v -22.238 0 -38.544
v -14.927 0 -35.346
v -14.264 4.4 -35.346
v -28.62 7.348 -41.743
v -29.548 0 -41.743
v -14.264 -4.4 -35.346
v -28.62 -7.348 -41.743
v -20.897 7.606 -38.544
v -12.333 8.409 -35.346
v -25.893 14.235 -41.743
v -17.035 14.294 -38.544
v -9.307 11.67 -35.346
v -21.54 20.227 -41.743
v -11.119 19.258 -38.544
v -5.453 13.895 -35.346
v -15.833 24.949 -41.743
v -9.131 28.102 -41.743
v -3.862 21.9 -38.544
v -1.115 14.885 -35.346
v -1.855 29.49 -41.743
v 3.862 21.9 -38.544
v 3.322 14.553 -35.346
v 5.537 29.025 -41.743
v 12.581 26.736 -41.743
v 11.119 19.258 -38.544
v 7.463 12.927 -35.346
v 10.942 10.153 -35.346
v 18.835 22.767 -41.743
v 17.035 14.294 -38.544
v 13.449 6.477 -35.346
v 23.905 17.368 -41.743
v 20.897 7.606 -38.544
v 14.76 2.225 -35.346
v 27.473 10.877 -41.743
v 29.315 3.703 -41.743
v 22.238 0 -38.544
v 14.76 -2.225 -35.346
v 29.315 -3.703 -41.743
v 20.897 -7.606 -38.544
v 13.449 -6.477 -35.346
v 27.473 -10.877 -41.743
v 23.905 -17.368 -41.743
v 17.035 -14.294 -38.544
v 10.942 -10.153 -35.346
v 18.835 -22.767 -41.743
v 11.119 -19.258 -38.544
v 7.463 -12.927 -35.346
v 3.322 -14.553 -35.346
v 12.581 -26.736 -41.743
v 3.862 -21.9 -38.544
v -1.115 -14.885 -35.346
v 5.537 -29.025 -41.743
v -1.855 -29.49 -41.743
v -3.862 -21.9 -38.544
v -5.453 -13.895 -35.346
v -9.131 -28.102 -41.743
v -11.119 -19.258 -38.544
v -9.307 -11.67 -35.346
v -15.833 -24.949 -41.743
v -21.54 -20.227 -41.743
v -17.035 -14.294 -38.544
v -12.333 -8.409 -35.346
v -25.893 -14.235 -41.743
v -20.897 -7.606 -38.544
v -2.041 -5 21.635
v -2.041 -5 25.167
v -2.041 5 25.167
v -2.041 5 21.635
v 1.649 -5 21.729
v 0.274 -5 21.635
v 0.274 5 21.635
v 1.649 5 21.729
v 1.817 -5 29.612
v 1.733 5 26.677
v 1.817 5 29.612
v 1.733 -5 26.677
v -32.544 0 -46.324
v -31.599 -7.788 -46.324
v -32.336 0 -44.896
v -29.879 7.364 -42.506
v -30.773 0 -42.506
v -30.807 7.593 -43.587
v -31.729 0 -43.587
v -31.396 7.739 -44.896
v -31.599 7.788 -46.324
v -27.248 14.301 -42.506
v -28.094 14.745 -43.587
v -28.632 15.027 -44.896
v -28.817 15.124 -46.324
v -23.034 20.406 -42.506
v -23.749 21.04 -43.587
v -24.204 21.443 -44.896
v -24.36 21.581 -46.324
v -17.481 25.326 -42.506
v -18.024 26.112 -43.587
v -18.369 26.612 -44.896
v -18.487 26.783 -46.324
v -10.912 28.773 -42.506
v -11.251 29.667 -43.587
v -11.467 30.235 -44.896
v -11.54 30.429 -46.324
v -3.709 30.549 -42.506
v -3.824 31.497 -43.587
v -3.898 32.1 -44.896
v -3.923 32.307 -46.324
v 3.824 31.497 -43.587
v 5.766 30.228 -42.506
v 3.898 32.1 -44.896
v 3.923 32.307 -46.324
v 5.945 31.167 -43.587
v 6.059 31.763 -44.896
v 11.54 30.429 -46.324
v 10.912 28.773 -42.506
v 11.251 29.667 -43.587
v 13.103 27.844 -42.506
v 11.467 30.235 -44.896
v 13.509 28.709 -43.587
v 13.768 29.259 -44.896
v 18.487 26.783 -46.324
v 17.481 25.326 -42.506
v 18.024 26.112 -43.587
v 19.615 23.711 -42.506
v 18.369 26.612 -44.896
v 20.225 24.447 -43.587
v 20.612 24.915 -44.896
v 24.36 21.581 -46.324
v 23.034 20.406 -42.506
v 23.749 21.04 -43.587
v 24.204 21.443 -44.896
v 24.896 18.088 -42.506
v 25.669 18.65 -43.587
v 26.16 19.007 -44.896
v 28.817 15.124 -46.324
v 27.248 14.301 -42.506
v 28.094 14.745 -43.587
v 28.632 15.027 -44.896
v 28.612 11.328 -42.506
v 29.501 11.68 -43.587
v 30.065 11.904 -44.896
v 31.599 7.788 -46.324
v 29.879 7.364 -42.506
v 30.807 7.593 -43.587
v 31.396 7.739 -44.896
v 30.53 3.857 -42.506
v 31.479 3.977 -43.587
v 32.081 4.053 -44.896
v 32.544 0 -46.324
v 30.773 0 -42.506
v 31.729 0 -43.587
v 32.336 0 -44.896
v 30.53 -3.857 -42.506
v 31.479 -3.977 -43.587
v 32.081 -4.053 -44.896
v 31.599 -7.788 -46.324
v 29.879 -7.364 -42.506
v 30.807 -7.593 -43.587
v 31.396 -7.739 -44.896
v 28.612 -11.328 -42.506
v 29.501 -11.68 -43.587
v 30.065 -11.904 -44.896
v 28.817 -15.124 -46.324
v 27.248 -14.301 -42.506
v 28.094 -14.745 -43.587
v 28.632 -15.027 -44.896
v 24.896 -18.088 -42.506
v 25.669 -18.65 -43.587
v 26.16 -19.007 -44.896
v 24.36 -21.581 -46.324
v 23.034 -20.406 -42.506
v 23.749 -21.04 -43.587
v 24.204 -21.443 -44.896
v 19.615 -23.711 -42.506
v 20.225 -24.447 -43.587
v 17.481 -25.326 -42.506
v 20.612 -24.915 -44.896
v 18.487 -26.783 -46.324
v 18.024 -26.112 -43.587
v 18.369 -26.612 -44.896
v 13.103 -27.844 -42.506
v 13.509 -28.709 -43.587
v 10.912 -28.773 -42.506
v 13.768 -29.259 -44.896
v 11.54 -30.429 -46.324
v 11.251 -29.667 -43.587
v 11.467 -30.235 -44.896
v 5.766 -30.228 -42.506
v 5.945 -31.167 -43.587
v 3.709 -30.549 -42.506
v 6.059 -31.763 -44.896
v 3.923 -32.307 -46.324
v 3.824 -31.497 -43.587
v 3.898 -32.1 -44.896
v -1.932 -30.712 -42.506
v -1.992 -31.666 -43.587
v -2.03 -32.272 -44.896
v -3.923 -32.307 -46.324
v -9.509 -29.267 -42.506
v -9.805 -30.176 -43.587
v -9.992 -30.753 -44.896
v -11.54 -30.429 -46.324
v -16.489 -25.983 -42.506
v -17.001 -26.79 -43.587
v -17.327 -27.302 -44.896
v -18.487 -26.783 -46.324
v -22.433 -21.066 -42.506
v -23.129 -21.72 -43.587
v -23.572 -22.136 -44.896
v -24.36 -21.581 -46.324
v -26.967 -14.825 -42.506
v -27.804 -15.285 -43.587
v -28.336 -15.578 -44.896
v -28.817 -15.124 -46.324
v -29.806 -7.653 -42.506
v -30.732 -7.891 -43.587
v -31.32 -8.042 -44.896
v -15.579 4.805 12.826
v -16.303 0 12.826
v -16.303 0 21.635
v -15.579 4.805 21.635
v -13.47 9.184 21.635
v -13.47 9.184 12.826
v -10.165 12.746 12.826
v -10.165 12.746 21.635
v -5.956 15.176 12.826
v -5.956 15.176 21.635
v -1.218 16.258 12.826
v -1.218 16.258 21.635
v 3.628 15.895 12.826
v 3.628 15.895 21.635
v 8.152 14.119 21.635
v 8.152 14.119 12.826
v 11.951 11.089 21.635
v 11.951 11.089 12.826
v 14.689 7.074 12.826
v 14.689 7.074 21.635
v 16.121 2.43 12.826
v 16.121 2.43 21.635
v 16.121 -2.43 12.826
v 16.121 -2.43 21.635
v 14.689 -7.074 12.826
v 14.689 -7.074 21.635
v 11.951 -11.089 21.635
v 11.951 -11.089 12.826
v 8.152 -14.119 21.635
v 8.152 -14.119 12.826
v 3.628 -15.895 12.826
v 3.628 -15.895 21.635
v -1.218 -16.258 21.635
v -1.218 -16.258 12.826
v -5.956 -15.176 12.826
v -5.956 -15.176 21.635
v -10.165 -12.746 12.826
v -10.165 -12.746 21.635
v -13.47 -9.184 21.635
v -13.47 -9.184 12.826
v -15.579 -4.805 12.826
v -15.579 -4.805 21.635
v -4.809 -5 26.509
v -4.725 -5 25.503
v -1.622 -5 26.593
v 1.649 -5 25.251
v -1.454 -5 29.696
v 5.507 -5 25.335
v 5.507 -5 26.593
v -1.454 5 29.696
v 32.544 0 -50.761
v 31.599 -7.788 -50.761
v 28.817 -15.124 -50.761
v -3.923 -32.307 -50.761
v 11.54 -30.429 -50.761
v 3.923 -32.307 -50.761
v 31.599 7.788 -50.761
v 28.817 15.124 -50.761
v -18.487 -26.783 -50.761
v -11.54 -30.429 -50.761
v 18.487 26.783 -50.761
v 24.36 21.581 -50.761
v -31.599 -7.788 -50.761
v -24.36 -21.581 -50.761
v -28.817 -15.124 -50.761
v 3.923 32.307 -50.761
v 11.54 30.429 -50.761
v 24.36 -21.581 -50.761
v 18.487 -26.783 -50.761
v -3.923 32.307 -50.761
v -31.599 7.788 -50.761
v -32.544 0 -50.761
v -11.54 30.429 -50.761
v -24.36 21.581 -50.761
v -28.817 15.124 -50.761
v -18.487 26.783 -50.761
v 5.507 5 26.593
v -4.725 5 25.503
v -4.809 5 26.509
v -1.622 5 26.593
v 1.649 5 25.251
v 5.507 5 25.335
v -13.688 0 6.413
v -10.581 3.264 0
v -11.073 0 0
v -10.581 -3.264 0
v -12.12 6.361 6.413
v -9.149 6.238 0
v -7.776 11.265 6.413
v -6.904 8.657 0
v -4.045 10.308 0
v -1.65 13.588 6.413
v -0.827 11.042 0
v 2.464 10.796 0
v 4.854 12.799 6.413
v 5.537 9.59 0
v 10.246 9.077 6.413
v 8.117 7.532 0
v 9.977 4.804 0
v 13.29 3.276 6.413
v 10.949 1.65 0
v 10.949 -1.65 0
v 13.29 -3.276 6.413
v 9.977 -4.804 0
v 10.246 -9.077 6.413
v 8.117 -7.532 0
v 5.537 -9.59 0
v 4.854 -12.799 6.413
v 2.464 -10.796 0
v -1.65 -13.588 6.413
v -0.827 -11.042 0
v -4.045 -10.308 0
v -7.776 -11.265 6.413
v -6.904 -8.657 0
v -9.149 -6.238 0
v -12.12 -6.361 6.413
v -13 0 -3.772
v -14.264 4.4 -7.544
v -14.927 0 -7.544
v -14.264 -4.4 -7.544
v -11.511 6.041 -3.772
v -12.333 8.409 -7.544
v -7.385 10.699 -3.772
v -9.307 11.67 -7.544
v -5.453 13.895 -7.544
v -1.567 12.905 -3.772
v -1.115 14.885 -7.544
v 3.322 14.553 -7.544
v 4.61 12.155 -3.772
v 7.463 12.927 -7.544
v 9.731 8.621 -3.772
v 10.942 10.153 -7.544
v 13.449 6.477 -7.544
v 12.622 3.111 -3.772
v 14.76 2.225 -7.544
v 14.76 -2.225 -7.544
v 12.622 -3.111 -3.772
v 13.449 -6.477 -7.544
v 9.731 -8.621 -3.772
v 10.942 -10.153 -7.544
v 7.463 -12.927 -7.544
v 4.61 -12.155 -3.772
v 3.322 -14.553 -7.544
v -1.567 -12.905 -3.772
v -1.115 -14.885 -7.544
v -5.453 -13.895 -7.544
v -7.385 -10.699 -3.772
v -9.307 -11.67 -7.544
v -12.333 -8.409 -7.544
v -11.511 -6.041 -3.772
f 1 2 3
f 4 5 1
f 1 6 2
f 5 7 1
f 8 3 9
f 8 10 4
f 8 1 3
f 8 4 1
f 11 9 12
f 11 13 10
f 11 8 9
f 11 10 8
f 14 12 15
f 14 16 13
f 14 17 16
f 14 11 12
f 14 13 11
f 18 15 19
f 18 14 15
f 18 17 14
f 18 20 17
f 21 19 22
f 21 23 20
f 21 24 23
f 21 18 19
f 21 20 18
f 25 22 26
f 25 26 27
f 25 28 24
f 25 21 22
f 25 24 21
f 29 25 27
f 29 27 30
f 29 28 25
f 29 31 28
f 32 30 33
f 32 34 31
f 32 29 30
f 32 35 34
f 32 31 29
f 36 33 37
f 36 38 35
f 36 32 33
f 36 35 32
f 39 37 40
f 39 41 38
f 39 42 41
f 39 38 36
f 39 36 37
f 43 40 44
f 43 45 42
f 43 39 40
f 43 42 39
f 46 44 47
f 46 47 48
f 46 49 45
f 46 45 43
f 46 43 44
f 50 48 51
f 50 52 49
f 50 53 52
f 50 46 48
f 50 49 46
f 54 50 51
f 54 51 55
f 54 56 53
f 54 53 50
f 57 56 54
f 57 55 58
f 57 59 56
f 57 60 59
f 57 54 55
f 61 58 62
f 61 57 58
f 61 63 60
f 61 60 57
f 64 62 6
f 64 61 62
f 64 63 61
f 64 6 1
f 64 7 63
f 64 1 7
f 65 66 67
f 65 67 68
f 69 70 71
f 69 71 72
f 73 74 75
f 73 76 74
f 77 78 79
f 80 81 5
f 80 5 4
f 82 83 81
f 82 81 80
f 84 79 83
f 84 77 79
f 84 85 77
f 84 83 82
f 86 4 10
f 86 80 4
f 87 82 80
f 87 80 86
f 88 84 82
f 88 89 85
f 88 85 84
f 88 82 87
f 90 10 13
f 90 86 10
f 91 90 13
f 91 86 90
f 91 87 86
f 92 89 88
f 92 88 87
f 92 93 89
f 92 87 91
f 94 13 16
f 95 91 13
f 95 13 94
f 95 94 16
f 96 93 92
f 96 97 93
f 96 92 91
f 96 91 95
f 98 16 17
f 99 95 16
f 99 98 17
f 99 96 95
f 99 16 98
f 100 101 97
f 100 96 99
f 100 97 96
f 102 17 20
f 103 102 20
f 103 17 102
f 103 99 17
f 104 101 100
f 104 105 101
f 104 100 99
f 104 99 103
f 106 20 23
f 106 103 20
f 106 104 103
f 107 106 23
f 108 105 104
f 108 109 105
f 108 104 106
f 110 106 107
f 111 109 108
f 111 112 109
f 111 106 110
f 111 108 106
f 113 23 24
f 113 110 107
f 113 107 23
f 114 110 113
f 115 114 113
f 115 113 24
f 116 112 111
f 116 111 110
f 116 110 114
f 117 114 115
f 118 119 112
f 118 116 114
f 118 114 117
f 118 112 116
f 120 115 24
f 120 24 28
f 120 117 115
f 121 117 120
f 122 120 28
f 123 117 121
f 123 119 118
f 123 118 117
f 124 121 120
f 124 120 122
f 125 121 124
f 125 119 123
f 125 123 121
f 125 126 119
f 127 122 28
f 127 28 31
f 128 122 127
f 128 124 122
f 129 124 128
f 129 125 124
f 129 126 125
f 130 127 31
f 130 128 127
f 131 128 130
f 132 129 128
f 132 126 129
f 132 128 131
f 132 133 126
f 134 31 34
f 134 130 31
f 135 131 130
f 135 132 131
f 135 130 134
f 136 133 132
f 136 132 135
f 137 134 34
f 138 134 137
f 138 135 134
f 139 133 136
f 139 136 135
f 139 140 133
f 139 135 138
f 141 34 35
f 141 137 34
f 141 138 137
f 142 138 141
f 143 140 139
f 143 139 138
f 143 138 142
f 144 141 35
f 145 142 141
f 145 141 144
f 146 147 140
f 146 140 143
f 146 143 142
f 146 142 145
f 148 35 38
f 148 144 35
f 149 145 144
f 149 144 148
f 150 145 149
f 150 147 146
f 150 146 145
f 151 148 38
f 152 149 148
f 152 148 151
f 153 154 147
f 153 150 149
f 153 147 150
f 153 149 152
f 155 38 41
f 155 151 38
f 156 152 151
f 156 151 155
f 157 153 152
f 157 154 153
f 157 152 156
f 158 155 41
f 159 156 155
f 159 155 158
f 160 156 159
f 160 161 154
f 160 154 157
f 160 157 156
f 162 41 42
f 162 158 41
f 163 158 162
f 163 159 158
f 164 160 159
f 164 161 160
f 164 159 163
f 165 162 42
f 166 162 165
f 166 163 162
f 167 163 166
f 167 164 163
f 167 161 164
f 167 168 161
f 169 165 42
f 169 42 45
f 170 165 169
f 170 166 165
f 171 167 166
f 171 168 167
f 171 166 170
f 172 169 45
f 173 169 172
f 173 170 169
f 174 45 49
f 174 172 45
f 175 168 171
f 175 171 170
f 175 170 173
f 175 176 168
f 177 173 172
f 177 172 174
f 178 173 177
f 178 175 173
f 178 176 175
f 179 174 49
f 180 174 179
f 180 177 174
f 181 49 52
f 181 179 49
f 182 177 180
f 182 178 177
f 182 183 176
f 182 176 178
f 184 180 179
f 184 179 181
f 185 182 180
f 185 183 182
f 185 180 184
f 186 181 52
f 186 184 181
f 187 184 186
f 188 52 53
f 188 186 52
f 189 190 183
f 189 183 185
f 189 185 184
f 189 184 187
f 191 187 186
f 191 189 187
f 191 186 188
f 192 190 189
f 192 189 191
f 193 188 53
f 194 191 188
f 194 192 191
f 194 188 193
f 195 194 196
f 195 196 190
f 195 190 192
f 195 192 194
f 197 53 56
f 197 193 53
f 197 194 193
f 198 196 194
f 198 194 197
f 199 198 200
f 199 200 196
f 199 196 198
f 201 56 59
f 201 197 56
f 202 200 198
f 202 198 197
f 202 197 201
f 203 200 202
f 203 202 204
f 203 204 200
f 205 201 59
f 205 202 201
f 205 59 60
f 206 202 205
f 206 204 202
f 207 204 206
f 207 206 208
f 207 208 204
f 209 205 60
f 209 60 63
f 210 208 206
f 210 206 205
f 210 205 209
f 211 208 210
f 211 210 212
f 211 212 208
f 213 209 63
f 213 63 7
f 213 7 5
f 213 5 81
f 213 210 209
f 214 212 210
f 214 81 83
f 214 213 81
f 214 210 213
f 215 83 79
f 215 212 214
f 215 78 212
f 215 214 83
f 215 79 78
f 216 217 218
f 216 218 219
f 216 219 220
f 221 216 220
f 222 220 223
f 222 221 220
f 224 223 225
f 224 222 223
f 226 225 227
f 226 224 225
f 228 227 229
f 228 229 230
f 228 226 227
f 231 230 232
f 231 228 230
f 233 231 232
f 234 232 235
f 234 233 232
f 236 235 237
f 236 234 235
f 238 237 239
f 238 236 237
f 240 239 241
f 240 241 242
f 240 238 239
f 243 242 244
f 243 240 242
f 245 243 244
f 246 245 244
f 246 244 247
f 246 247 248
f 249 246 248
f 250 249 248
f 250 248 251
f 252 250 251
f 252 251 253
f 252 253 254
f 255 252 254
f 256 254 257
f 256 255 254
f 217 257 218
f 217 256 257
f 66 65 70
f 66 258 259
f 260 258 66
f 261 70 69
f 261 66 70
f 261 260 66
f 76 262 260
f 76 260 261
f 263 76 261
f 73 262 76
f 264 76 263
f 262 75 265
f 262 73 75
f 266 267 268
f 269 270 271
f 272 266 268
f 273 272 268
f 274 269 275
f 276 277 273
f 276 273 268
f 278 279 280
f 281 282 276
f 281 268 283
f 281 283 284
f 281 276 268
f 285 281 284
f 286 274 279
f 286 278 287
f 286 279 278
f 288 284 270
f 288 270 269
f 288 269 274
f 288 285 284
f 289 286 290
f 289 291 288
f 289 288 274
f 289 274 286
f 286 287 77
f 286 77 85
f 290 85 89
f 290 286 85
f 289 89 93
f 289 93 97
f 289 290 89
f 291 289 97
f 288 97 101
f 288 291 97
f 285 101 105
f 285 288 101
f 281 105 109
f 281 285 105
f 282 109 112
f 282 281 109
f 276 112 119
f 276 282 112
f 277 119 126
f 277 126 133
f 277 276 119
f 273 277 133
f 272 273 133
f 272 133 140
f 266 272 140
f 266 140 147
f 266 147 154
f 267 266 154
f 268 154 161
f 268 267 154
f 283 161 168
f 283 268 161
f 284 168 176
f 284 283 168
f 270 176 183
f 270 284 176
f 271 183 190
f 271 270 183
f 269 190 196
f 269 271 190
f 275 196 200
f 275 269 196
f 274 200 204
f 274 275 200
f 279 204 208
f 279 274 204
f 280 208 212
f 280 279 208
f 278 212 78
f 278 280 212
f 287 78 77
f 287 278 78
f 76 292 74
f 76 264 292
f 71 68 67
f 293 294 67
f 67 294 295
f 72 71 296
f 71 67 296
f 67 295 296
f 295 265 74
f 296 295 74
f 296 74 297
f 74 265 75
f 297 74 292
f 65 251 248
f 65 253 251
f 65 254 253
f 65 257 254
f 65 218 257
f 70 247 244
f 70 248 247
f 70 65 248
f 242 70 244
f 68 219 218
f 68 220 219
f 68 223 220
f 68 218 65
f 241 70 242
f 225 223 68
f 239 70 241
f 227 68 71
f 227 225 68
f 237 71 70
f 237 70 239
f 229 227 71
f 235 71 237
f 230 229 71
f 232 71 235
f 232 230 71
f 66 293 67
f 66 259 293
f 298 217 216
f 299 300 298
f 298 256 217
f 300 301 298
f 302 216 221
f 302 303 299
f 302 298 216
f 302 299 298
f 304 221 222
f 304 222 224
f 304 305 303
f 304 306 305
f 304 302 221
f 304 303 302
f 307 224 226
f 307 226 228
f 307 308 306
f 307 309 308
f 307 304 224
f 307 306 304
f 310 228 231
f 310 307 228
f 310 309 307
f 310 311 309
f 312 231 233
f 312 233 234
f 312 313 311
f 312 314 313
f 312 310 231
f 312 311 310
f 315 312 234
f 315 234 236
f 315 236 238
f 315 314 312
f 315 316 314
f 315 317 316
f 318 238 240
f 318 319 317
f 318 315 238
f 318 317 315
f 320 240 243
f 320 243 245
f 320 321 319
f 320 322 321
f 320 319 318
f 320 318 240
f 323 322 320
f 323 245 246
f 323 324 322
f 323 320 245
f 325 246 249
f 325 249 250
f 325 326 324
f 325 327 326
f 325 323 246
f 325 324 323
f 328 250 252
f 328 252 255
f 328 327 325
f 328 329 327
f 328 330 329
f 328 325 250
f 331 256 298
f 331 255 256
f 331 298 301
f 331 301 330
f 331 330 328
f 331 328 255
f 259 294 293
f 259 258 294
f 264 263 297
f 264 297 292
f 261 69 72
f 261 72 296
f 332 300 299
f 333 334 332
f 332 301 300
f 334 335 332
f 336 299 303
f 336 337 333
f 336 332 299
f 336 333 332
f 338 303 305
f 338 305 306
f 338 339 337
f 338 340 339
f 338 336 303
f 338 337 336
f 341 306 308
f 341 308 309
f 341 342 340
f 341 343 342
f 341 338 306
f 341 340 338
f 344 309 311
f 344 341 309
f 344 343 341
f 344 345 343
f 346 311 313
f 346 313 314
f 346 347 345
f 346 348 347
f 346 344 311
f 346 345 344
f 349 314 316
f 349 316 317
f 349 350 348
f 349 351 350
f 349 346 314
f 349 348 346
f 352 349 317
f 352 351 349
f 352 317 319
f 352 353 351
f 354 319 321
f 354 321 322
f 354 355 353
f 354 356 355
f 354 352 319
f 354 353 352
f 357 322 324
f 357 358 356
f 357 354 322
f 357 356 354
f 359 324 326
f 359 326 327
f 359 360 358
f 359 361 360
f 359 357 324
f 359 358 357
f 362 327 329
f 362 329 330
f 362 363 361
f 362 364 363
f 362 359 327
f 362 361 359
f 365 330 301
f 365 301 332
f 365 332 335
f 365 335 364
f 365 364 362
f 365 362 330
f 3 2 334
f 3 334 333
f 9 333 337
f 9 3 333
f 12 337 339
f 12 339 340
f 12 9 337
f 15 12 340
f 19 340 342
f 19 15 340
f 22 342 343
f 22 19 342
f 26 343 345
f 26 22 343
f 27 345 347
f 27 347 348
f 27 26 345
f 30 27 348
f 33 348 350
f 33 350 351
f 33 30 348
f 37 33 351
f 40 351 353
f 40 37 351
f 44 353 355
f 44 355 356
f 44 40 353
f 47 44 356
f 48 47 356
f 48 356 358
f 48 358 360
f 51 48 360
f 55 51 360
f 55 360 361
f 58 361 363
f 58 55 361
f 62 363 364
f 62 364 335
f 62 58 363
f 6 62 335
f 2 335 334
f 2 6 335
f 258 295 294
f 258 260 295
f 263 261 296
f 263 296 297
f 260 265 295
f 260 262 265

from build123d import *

# Parameters (mm, degrees)
F3_DEPTH = 5


with BuildPart() as f1:
    # F0 (on Front) → F1 (revolve)
    with BuildSketch(Plane.XZ):
        with BuildLine():
            Line((-32.54427, -50.761096), (0, -50.761096))
            Line((0, -50.761096), (0, 21.635026))
            Line((0, 21.635026), (-16.303314, 21.635026))
            Line((-16.303314, 21.635026), (-16.303314, 12.826373))
            Line((-16.303314, 12.826373), (-11.073175, 0))
            Line((-11.073175, 0), (-14.926962, -7.54364))
            Line((-14.926962, -7.54364), (-14.926962, -35.345953))
            Line((-14.926962, -35.345953), (-29.548365, -41.742818))
            ThreePointArc((-29.548365, -41.742818), (-31.728794, -43.586861), (-32.54427, -46.323604))
            Line((-32.54427, -46.323604), (-32.54427, -50.761096))
        make_face()
    revolve(axis=Axis((0, 0, -14.563035), (0, 0, -1)))

    # F2 (on Front) → F3 (join)
    with BuildSketch(Plane.XZ):
        Polygon((-2.04105, 21.477198), (1.649017, 21.728793), (1.649017, 25.25113), (5.506815, 25.334995), (5.506815, 26.592974), (1.732882, 26.676839), (1.816748, 29.612118), (-1.453994, 29.695984), (-1.621724, 26.592974), (-4.808601, 26.509108), (-4.724736, 25.502726), (-2.04105, 25.167266), align=None)
    extrude(amount=F3_DEPTH)

    # F4: F1 across face


with BuildPart() as f1_1:
    add(f1.part)
    add(f1.part.mirror(Plane(origin=(0.130619, 0, 25.64342), x_dir=(1, 0, 0), z_dir=(0, 1, 0))))


solid = f1_1.part
